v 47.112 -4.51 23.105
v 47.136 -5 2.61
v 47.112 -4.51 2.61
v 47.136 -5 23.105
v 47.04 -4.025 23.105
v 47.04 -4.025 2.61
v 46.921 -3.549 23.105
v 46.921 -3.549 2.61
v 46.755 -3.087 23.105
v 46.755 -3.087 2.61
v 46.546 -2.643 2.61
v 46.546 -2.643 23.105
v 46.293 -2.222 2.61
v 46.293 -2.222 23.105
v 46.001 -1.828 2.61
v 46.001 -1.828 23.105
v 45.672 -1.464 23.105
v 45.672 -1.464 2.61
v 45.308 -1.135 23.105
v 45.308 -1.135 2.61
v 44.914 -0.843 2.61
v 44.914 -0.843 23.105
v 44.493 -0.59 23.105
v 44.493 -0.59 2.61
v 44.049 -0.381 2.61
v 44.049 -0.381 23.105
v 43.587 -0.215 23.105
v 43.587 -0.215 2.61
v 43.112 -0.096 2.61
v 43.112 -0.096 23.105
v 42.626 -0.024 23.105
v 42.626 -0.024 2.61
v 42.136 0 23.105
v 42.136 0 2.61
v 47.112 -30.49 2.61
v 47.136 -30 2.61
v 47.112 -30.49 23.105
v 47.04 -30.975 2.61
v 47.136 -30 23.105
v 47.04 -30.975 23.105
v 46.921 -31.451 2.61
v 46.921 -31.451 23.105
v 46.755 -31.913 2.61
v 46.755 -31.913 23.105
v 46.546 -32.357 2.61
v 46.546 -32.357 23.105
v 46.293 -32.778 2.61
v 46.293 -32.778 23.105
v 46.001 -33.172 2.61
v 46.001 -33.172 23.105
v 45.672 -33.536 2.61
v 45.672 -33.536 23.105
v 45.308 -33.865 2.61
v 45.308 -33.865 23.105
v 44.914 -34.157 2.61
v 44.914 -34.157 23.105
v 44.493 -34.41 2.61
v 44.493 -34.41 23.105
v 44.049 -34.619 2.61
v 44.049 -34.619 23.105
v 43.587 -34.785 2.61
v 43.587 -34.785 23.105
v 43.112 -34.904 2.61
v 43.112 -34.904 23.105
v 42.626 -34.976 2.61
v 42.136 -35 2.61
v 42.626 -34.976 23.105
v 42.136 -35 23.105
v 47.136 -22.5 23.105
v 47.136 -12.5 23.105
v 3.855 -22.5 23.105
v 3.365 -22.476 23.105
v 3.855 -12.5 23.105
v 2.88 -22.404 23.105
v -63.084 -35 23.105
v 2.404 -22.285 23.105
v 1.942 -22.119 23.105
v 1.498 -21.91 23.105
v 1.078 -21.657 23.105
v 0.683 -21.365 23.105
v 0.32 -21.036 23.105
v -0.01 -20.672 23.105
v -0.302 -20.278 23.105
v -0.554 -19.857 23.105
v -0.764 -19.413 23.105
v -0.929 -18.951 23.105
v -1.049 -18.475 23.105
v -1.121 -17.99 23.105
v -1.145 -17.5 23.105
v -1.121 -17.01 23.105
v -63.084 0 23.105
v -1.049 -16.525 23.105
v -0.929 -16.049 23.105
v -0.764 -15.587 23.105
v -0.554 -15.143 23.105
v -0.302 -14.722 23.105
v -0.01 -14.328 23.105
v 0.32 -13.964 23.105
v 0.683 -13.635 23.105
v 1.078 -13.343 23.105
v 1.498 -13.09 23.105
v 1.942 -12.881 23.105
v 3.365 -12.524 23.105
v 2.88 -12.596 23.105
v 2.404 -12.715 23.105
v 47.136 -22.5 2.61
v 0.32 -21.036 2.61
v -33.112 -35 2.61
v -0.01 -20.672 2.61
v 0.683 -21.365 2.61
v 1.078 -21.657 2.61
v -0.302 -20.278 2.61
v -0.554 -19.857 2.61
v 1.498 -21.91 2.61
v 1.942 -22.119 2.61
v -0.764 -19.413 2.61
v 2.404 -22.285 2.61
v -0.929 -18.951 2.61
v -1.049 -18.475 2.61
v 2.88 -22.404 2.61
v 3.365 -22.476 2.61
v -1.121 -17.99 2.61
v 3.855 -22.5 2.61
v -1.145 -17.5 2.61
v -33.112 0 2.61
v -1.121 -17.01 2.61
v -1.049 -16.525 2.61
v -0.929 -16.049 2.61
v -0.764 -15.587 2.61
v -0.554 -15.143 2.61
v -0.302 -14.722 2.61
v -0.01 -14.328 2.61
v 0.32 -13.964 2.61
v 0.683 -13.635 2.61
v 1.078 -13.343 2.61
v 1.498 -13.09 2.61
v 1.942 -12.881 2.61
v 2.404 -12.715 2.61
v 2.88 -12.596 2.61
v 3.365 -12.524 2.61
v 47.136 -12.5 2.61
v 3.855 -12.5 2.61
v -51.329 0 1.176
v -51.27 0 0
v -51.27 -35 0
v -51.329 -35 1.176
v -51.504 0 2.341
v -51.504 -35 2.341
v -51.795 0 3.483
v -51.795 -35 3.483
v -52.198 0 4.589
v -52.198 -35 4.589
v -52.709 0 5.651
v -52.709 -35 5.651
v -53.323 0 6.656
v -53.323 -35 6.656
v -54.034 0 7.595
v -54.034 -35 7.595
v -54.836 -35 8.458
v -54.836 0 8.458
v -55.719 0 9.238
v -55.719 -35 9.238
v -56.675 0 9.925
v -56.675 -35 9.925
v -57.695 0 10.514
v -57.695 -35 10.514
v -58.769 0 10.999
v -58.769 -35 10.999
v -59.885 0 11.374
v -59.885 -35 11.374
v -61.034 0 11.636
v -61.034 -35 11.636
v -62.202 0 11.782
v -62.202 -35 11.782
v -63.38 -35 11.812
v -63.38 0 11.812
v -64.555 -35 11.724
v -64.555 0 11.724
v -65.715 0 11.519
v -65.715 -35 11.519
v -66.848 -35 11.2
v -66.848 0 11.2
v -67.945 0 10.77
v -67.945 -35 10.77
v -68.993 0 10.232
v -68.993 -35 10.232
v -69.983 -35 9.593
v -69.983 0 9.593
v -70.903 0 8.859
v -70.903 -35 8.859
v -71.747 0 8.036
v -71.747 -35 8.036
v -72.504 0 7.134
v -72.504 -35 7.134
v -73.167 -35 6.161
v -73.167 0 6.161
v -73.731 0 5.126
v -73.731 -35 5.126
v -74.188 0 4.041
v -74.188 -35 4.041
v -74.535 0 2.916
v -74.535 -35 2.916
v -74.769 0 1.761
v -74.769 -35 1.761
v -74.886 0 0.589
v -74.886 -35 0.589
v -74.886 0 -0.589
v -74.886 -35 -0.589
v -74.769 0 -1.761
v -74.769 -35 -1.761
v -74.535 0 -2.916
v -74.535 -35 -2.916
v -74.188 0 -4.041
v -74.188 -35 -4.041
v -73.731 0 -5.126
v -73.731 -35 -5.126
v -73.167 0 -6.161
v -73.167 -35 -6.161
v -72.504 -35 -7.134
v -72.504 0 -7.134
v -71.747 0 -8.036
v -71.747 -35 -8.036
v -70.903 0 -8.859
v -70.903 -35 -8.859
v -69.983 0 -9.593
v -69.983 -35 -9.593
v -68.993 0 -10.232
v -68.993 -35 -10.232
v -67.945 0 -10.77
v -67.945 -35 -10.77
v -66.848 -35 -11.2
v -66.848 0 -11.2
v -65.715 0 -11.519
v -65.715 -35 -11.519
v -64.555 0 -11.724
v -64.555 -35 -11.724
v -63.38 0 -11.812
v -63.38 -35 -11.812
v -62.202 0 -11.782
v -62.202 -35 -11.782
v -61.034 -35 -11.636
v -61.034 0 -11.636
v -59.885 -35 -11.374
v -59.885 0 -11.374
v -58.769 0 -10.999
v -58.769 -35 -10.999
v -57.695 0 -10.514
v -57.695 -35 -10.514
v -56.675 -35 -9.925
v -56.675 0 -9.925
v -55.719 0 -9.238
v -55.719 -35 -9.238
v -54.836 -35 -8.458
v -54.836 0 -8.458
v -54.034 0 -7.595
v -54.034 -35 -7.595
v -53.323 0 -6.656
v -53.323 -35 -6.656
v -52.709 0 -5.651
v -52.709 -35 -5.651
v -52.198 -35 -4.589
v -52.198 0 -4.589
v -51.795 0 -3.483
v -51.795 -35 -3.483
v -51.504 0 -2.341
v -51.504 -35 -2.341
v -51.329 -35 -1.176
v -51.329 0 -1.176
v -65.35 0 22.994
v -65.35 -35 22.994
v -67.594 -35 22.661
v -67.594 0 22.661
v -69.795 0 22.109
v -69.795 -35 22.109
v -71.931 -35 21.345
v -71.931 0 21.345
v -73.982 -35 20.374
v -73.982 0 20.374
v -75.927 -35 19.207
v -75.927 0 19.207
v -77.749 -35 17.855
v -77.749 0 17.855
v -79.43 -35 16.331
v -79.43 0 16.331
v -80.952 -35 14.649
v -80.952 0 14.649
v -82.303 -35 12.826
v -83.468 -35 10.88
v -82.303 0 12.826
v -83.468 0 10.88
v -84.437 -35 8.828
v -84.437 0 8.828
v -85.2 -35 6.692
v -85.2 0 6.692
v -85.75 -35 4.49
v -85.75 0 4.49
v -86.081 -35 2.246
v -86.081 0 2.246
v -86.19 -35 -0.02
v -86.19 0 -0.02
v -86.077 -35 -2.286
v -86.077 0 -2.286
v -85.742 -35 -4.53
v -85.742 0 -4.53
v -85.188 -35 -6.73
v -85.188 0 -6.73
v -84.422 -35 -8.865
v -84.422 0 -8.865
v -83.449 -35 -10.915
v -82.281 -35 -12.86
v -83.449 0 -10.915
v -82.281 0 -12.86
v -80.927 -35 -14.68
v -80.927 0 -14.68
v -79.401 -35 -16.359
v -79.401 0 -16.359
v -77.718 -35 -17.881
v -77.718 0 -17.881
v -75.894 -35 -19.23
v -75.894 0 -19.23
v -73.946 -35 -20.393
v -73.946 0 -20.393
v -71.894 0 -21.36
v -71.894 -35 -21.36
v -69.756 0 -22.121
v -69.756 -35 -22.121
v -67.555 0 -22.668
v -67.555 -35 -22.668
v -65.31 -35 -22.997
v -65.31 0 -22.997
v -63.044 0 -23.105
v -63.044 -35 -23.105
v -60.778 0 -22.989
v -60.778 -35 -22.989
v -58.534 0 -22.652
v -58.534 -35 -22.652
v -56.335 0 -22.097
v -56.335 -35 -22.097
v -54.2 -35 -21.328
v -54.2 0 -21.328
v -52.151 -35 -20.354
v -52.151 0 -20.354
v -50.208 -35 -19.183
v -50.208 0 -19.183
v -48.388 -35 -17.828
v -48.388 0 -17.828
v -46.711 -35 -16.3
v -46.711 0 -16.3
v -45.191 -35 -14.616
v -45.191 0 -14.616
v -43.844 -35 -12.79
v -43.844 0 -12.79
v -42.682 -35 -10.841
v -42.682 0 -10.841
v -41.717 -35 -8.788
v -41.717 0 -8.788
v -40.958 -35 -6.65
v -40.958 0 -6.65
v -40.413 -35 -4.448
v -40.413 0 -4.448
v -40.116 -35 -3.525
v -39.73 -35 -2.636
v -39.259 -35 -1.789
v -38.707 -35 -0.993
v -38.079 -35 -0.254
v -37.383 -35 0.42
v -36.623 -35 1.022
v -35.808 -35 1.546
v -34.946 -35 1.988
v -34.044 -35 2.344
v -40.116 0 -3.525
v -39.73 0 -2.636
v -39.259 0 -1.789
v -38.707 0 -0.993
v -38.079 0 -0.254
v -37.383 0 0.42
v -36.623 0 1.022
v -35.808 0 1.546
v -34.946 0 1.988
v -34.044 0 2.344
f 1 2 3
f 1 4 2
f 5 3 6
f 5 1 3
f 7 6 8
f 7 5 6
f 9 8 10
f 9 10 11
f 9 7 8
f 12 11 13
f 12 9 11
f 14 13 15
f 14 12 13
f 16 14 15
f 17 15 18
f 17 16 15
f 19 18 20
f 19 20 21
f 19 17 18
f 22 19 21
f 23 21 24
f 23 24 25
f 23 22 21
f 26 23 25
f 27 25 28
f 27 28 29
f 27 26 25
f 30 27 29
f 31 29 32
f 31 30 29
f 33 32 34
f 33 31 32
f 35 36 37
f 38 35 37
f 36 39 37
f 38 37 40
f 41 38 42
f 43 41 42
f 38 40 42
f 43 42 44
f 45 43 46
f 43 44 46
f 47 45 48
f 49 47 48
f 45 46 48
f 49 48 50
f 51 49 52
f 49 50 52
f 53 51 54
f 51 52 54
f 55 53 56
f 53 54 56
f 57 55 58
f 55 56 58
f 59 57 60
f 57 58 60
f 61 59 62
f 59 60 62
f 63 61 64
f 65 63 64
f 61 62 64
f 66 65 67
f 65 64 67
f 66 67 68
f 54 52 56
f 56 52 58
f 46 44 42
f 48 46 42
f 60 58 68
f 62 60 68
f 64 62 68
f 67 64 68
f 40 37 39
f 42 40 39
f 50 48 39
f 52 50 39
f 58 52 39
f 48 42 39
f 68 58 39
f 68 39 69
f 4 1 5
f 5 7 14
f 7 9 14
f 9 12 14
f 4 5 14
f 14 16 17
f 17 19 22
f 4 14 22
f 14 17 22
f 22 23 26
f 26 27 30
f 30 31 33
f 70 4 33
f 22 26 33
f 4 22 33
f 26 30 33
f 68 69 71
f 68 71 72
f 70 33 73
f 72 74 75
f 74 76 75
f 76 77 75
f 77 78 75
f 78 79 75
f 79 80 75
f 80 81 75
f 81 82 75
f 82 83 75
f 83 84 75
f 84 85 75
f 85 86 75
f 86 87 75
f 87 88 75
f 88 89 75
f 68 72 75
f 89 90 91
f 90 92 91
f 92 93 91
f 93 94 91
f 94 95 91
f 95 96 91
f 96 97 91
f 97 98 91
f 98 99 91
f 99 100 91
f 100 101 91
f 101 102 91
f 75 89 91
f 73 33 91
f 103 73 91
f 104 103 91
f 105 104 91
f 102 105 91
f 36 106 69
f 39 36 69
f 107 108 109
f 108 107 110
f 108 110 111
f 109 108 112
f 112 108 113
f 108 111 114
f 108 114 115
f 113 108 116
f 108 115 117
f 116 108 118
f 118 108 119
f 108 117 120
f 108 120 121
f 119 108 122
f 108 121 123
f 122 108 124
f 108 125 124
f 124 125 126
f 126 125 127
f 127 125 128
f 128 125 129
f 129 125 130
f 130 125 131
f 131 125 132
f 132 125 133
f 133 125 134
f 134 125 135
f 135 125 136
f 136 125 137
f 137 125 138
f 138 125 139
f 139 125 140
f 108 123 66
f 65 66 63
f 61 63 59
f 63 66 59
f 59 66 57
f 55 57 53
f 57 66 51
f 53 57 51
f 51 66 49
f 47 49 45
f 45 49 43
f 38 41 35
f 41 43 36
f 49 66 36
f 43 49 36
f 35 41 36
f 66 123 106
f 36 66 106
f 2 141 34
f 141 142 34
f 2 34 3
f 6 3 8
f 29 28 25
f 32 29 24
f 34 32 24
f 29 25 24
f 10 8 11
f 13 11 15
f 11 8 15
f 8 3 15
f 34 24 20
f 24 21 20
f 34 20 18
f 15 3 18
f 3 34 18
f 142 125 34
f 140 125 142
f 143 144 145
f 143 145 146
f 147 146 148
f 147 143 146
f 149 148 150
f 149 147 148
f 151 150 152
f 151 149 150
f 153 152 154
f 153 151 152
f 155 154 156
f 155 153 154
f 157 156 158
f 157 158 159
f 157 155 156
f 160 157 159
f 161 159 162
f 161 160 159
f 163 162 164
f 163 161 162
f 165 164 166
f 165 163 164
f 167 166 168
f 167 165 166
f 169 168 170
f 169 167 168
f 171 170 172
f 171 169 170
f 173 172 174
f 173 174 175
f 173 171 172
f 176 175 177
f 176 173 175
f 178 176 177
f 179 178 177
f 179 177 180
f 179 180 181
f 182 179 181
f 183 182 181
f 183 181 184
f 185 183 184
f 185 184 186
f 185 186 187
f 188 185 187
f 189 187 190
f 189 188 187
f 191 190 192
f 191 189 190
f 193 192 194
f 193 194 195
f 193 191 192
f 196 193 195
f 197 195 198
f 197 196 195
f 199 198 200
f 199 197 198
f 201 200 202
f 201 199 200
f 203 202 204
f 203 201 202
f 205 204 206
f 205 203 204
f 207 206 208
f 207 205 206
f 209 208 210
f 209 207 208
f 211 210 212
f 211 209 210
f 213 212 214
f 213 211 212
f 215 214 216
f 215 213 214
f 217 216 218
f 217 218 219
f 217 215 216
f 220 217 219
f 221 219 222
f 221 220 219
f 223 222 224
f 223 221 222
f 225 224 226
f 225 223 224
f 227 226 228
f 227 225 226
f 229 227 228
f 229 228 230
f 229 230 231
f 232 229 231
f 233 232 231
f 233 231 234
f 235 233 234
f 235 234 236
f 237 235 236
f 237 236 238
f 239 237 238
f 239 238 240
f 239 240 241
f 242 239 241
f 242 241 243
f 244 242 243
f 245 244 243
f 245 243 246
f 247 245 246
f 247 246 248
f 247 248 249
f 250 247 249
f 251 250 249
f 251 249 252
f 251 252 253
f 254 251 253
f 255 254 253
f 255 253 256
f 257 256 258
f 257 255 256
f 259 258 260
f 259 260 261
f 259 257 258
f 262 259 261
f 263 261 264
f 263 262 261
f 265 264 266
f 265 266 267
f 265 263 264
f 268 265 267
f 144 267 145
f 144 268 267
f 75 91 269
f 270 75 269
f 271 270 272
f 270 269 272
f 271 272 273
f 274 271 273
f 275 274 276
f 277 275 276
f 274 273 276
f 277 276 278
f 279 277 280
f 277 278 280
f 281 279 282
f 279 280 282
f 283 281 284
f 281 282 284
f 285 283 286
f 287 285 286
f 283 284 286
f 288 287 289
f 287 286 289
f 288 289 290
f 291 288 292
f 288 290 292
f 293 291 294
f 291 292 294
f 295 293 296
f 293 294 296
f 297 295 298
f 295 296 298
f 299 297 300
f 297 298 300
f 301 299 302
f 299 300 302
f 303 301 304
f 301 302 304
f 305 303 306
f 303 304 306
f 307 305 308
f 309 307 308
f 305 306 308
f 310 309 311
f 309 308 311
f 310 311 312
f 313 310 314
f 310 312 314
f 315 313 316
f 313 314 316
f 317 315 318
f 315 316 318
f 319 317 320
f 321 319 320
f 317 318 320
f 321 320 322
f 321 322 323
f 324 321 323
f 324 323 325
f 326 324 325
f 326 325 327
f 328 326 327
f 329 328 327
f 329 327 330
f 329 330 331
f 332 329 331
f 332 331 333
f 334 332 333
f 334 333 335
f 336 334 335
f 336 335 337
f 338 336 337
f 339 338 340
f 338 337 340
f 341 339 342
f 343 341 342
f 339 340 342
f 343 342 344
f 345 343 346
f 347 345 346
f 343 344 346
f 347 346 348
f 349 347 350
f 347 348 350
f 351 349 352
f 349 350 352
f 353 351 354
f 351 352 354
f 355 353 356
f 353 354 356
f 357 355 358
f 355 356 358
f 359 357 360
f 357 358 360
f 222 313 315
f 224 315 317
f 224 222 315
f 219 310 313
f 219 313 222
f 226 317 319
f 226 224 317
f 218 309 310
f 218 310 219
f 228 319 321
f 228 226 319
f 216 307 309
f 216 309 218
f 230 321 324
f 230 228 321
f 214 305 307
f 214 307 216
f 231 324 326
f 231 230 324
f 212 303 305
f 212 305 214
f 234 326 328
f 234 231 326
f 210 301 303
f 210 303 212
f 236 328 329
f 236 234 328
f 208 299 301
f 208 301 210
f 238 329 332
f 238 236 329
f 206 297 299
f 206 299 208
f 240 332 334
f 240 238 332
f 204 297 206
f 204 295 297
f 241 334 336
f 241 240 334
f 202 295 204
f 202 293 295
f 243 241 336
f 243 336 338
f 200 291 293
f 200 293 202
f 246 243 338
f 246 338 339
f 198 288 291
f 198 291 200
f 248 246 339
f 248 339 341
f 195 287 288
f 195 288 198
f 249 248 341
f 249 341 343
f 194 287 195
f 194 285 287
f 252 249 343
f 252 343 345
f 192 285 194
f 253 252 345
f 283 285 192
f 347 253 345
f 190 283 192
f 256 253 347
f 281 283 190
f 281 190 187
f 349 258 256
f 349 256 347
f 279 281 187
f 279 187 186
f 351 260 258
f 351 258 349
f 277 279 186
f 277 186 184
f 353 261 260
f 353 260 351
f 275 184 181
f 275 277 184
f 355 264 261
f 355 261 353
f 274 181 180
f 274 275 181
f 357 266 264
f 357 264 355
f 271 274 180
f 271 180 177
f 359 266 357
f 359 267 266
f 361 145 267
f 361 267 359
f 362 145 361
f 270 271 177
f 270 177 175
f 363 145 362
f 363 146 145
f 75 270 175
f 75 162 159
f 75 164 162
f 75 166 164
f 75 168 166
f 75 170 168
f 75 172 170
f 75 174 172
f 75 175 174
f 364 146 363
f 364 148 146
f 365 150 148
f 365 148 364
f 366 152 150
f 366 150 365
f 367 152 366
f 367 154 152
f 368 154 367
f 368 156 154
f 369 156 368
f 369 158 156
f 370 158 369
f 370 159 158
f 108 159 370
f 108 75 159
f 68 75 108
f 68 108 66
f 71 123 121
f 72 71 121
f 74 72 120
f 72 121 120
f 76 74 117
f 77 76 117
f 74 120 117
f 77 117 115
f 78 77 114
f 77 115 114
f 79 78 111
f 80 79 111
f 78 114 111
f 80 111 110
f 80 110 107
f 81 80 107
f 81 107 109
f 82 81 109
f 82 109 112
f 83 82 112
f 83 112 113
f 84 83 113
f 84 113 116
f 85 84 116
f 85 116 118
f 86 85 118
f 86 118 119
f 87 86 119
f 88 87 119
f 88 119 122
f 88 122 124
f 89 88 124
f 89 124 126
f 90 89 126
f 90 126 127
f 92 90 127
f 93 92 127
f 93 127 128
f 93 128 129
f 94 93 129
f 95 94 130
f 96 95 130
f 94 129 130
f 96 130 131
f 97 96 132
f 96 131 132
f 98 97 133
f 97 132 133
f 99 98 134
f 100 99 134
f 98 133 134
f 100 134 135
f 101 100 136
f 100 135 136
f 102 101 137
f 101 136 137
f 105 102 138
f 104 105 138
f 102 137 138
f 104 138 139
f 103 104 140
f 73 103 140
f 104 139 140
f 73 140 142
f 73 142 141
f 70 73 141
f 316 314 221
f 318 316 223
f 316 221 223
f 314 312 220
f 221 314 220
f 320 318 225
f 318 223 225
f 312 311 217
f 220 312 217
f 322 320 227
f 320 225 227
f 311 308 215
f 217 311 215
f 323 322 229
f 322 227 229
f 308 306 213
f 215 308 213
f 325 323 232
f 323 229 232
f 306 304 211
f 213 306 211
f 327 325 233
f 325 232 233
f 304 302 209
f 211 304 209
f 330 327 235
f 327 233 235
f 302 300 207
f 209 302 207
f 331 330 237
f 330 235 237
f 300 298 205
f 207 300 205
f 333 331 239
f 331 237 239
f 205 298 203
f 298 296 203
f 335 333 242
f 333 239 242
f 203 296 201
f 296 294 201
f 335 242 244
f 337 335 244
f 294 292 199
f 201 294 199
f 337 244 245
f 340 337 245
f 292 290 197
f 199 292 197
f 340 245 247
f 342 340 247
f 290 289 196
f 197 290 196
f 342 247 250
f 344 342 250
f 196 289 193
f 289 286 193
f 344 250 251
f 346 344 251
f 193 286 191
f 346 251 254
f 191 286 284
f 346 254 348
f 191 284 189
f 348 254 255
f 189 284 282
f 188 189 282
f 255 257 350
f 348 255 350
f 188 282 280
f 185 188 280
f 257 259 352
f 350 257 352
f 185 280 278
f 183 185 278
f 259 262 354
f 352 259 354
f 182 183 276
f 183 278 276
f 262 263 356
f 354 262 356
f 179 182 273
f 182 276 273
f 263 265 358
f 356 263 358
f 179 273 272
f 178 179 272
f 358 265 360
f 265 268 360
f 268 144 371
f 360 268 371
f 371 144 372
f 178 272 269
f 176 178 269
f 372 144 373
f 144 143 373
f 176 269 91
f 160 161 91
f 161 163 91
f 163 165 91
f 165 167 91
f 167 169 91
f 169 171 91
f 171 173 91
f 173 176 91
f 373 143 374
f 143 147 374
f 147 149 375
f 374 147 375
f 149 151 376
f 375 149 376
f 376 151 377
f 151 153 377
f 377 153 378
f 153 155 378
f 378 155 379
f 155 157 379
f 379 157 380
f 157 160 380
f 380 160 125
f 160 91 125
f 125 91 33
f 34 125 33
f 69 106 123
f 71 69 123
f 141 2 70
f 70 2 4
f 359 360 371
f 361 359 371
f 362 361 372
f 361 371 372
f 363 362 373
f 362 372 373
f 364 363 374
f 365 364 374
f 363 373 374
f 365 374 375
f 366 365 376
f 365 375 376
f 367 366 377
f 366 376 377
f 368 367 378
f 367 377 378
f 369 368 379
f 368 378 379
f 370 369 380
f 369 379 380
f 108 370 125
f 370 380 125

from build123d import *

# Parameters (mm, degrees)
F0_R     = 11.815332
F1_DEPTH = 35
F2_R     = 5
F4_DEPTH = 40


with BuildPart() as f1:
    # F0 (on Front) → F1 (new body)
    with BuildSketch(Plane.XZ):
        with BuildLine():
            Line((47.136076, 23.104757), (-63.083914, 23.104757))
            ThreePointArc((-63.083914, 23.104757), (-80.926867, -14.680376), (-40.412867, -4.447924))
            ThreePointArc((-40.412867, -4.447924), (-37.739192, 0.091286), (-33.111934, 2.609511))
            Line((-33.111934, 2.609511), (47.136076, 2.609511))
            Line((47.136076, 2.609511), (47.136076, 23.104757))
        make_face()
        with Locations((-63.085444, 0)):
            Circle(F0_R, mode=Mode.SUBTRACT)
    extrude(amount=F1_DEPTH)

    # F2
    f2_edges = [f1.edges().sort_by_distance(p)[0] for p in [
        (47.136076, -35, 12.857134),
        (47.136076, 0, 12.857134),
    ]]
    fillet(f2_edges, radius=F2_R)

    # F3 (on face) → F4 (cut)
    with BuildSketch(Plane(origin=(0, 0, 2.609511), x_dir=(1, 0, 0), z_dir=(0, 0, -1))):
        with BuildLine():
            Line((47.136076, 12.5), (47.136076, 22.5))
            Line((47.136076, 22.5), (3.855412, 22.5))
            ThreePointArc((3.855412, 22.5), (-1.144588, 17.5), (3.855412, 12.5))
            Line((3.855412, 12.5), (47.136076, 12.5))
        make_face()
    extrude(amount=-F4_DEPTH, mode=Mode.SUBTRACT)


solid = f1.part
